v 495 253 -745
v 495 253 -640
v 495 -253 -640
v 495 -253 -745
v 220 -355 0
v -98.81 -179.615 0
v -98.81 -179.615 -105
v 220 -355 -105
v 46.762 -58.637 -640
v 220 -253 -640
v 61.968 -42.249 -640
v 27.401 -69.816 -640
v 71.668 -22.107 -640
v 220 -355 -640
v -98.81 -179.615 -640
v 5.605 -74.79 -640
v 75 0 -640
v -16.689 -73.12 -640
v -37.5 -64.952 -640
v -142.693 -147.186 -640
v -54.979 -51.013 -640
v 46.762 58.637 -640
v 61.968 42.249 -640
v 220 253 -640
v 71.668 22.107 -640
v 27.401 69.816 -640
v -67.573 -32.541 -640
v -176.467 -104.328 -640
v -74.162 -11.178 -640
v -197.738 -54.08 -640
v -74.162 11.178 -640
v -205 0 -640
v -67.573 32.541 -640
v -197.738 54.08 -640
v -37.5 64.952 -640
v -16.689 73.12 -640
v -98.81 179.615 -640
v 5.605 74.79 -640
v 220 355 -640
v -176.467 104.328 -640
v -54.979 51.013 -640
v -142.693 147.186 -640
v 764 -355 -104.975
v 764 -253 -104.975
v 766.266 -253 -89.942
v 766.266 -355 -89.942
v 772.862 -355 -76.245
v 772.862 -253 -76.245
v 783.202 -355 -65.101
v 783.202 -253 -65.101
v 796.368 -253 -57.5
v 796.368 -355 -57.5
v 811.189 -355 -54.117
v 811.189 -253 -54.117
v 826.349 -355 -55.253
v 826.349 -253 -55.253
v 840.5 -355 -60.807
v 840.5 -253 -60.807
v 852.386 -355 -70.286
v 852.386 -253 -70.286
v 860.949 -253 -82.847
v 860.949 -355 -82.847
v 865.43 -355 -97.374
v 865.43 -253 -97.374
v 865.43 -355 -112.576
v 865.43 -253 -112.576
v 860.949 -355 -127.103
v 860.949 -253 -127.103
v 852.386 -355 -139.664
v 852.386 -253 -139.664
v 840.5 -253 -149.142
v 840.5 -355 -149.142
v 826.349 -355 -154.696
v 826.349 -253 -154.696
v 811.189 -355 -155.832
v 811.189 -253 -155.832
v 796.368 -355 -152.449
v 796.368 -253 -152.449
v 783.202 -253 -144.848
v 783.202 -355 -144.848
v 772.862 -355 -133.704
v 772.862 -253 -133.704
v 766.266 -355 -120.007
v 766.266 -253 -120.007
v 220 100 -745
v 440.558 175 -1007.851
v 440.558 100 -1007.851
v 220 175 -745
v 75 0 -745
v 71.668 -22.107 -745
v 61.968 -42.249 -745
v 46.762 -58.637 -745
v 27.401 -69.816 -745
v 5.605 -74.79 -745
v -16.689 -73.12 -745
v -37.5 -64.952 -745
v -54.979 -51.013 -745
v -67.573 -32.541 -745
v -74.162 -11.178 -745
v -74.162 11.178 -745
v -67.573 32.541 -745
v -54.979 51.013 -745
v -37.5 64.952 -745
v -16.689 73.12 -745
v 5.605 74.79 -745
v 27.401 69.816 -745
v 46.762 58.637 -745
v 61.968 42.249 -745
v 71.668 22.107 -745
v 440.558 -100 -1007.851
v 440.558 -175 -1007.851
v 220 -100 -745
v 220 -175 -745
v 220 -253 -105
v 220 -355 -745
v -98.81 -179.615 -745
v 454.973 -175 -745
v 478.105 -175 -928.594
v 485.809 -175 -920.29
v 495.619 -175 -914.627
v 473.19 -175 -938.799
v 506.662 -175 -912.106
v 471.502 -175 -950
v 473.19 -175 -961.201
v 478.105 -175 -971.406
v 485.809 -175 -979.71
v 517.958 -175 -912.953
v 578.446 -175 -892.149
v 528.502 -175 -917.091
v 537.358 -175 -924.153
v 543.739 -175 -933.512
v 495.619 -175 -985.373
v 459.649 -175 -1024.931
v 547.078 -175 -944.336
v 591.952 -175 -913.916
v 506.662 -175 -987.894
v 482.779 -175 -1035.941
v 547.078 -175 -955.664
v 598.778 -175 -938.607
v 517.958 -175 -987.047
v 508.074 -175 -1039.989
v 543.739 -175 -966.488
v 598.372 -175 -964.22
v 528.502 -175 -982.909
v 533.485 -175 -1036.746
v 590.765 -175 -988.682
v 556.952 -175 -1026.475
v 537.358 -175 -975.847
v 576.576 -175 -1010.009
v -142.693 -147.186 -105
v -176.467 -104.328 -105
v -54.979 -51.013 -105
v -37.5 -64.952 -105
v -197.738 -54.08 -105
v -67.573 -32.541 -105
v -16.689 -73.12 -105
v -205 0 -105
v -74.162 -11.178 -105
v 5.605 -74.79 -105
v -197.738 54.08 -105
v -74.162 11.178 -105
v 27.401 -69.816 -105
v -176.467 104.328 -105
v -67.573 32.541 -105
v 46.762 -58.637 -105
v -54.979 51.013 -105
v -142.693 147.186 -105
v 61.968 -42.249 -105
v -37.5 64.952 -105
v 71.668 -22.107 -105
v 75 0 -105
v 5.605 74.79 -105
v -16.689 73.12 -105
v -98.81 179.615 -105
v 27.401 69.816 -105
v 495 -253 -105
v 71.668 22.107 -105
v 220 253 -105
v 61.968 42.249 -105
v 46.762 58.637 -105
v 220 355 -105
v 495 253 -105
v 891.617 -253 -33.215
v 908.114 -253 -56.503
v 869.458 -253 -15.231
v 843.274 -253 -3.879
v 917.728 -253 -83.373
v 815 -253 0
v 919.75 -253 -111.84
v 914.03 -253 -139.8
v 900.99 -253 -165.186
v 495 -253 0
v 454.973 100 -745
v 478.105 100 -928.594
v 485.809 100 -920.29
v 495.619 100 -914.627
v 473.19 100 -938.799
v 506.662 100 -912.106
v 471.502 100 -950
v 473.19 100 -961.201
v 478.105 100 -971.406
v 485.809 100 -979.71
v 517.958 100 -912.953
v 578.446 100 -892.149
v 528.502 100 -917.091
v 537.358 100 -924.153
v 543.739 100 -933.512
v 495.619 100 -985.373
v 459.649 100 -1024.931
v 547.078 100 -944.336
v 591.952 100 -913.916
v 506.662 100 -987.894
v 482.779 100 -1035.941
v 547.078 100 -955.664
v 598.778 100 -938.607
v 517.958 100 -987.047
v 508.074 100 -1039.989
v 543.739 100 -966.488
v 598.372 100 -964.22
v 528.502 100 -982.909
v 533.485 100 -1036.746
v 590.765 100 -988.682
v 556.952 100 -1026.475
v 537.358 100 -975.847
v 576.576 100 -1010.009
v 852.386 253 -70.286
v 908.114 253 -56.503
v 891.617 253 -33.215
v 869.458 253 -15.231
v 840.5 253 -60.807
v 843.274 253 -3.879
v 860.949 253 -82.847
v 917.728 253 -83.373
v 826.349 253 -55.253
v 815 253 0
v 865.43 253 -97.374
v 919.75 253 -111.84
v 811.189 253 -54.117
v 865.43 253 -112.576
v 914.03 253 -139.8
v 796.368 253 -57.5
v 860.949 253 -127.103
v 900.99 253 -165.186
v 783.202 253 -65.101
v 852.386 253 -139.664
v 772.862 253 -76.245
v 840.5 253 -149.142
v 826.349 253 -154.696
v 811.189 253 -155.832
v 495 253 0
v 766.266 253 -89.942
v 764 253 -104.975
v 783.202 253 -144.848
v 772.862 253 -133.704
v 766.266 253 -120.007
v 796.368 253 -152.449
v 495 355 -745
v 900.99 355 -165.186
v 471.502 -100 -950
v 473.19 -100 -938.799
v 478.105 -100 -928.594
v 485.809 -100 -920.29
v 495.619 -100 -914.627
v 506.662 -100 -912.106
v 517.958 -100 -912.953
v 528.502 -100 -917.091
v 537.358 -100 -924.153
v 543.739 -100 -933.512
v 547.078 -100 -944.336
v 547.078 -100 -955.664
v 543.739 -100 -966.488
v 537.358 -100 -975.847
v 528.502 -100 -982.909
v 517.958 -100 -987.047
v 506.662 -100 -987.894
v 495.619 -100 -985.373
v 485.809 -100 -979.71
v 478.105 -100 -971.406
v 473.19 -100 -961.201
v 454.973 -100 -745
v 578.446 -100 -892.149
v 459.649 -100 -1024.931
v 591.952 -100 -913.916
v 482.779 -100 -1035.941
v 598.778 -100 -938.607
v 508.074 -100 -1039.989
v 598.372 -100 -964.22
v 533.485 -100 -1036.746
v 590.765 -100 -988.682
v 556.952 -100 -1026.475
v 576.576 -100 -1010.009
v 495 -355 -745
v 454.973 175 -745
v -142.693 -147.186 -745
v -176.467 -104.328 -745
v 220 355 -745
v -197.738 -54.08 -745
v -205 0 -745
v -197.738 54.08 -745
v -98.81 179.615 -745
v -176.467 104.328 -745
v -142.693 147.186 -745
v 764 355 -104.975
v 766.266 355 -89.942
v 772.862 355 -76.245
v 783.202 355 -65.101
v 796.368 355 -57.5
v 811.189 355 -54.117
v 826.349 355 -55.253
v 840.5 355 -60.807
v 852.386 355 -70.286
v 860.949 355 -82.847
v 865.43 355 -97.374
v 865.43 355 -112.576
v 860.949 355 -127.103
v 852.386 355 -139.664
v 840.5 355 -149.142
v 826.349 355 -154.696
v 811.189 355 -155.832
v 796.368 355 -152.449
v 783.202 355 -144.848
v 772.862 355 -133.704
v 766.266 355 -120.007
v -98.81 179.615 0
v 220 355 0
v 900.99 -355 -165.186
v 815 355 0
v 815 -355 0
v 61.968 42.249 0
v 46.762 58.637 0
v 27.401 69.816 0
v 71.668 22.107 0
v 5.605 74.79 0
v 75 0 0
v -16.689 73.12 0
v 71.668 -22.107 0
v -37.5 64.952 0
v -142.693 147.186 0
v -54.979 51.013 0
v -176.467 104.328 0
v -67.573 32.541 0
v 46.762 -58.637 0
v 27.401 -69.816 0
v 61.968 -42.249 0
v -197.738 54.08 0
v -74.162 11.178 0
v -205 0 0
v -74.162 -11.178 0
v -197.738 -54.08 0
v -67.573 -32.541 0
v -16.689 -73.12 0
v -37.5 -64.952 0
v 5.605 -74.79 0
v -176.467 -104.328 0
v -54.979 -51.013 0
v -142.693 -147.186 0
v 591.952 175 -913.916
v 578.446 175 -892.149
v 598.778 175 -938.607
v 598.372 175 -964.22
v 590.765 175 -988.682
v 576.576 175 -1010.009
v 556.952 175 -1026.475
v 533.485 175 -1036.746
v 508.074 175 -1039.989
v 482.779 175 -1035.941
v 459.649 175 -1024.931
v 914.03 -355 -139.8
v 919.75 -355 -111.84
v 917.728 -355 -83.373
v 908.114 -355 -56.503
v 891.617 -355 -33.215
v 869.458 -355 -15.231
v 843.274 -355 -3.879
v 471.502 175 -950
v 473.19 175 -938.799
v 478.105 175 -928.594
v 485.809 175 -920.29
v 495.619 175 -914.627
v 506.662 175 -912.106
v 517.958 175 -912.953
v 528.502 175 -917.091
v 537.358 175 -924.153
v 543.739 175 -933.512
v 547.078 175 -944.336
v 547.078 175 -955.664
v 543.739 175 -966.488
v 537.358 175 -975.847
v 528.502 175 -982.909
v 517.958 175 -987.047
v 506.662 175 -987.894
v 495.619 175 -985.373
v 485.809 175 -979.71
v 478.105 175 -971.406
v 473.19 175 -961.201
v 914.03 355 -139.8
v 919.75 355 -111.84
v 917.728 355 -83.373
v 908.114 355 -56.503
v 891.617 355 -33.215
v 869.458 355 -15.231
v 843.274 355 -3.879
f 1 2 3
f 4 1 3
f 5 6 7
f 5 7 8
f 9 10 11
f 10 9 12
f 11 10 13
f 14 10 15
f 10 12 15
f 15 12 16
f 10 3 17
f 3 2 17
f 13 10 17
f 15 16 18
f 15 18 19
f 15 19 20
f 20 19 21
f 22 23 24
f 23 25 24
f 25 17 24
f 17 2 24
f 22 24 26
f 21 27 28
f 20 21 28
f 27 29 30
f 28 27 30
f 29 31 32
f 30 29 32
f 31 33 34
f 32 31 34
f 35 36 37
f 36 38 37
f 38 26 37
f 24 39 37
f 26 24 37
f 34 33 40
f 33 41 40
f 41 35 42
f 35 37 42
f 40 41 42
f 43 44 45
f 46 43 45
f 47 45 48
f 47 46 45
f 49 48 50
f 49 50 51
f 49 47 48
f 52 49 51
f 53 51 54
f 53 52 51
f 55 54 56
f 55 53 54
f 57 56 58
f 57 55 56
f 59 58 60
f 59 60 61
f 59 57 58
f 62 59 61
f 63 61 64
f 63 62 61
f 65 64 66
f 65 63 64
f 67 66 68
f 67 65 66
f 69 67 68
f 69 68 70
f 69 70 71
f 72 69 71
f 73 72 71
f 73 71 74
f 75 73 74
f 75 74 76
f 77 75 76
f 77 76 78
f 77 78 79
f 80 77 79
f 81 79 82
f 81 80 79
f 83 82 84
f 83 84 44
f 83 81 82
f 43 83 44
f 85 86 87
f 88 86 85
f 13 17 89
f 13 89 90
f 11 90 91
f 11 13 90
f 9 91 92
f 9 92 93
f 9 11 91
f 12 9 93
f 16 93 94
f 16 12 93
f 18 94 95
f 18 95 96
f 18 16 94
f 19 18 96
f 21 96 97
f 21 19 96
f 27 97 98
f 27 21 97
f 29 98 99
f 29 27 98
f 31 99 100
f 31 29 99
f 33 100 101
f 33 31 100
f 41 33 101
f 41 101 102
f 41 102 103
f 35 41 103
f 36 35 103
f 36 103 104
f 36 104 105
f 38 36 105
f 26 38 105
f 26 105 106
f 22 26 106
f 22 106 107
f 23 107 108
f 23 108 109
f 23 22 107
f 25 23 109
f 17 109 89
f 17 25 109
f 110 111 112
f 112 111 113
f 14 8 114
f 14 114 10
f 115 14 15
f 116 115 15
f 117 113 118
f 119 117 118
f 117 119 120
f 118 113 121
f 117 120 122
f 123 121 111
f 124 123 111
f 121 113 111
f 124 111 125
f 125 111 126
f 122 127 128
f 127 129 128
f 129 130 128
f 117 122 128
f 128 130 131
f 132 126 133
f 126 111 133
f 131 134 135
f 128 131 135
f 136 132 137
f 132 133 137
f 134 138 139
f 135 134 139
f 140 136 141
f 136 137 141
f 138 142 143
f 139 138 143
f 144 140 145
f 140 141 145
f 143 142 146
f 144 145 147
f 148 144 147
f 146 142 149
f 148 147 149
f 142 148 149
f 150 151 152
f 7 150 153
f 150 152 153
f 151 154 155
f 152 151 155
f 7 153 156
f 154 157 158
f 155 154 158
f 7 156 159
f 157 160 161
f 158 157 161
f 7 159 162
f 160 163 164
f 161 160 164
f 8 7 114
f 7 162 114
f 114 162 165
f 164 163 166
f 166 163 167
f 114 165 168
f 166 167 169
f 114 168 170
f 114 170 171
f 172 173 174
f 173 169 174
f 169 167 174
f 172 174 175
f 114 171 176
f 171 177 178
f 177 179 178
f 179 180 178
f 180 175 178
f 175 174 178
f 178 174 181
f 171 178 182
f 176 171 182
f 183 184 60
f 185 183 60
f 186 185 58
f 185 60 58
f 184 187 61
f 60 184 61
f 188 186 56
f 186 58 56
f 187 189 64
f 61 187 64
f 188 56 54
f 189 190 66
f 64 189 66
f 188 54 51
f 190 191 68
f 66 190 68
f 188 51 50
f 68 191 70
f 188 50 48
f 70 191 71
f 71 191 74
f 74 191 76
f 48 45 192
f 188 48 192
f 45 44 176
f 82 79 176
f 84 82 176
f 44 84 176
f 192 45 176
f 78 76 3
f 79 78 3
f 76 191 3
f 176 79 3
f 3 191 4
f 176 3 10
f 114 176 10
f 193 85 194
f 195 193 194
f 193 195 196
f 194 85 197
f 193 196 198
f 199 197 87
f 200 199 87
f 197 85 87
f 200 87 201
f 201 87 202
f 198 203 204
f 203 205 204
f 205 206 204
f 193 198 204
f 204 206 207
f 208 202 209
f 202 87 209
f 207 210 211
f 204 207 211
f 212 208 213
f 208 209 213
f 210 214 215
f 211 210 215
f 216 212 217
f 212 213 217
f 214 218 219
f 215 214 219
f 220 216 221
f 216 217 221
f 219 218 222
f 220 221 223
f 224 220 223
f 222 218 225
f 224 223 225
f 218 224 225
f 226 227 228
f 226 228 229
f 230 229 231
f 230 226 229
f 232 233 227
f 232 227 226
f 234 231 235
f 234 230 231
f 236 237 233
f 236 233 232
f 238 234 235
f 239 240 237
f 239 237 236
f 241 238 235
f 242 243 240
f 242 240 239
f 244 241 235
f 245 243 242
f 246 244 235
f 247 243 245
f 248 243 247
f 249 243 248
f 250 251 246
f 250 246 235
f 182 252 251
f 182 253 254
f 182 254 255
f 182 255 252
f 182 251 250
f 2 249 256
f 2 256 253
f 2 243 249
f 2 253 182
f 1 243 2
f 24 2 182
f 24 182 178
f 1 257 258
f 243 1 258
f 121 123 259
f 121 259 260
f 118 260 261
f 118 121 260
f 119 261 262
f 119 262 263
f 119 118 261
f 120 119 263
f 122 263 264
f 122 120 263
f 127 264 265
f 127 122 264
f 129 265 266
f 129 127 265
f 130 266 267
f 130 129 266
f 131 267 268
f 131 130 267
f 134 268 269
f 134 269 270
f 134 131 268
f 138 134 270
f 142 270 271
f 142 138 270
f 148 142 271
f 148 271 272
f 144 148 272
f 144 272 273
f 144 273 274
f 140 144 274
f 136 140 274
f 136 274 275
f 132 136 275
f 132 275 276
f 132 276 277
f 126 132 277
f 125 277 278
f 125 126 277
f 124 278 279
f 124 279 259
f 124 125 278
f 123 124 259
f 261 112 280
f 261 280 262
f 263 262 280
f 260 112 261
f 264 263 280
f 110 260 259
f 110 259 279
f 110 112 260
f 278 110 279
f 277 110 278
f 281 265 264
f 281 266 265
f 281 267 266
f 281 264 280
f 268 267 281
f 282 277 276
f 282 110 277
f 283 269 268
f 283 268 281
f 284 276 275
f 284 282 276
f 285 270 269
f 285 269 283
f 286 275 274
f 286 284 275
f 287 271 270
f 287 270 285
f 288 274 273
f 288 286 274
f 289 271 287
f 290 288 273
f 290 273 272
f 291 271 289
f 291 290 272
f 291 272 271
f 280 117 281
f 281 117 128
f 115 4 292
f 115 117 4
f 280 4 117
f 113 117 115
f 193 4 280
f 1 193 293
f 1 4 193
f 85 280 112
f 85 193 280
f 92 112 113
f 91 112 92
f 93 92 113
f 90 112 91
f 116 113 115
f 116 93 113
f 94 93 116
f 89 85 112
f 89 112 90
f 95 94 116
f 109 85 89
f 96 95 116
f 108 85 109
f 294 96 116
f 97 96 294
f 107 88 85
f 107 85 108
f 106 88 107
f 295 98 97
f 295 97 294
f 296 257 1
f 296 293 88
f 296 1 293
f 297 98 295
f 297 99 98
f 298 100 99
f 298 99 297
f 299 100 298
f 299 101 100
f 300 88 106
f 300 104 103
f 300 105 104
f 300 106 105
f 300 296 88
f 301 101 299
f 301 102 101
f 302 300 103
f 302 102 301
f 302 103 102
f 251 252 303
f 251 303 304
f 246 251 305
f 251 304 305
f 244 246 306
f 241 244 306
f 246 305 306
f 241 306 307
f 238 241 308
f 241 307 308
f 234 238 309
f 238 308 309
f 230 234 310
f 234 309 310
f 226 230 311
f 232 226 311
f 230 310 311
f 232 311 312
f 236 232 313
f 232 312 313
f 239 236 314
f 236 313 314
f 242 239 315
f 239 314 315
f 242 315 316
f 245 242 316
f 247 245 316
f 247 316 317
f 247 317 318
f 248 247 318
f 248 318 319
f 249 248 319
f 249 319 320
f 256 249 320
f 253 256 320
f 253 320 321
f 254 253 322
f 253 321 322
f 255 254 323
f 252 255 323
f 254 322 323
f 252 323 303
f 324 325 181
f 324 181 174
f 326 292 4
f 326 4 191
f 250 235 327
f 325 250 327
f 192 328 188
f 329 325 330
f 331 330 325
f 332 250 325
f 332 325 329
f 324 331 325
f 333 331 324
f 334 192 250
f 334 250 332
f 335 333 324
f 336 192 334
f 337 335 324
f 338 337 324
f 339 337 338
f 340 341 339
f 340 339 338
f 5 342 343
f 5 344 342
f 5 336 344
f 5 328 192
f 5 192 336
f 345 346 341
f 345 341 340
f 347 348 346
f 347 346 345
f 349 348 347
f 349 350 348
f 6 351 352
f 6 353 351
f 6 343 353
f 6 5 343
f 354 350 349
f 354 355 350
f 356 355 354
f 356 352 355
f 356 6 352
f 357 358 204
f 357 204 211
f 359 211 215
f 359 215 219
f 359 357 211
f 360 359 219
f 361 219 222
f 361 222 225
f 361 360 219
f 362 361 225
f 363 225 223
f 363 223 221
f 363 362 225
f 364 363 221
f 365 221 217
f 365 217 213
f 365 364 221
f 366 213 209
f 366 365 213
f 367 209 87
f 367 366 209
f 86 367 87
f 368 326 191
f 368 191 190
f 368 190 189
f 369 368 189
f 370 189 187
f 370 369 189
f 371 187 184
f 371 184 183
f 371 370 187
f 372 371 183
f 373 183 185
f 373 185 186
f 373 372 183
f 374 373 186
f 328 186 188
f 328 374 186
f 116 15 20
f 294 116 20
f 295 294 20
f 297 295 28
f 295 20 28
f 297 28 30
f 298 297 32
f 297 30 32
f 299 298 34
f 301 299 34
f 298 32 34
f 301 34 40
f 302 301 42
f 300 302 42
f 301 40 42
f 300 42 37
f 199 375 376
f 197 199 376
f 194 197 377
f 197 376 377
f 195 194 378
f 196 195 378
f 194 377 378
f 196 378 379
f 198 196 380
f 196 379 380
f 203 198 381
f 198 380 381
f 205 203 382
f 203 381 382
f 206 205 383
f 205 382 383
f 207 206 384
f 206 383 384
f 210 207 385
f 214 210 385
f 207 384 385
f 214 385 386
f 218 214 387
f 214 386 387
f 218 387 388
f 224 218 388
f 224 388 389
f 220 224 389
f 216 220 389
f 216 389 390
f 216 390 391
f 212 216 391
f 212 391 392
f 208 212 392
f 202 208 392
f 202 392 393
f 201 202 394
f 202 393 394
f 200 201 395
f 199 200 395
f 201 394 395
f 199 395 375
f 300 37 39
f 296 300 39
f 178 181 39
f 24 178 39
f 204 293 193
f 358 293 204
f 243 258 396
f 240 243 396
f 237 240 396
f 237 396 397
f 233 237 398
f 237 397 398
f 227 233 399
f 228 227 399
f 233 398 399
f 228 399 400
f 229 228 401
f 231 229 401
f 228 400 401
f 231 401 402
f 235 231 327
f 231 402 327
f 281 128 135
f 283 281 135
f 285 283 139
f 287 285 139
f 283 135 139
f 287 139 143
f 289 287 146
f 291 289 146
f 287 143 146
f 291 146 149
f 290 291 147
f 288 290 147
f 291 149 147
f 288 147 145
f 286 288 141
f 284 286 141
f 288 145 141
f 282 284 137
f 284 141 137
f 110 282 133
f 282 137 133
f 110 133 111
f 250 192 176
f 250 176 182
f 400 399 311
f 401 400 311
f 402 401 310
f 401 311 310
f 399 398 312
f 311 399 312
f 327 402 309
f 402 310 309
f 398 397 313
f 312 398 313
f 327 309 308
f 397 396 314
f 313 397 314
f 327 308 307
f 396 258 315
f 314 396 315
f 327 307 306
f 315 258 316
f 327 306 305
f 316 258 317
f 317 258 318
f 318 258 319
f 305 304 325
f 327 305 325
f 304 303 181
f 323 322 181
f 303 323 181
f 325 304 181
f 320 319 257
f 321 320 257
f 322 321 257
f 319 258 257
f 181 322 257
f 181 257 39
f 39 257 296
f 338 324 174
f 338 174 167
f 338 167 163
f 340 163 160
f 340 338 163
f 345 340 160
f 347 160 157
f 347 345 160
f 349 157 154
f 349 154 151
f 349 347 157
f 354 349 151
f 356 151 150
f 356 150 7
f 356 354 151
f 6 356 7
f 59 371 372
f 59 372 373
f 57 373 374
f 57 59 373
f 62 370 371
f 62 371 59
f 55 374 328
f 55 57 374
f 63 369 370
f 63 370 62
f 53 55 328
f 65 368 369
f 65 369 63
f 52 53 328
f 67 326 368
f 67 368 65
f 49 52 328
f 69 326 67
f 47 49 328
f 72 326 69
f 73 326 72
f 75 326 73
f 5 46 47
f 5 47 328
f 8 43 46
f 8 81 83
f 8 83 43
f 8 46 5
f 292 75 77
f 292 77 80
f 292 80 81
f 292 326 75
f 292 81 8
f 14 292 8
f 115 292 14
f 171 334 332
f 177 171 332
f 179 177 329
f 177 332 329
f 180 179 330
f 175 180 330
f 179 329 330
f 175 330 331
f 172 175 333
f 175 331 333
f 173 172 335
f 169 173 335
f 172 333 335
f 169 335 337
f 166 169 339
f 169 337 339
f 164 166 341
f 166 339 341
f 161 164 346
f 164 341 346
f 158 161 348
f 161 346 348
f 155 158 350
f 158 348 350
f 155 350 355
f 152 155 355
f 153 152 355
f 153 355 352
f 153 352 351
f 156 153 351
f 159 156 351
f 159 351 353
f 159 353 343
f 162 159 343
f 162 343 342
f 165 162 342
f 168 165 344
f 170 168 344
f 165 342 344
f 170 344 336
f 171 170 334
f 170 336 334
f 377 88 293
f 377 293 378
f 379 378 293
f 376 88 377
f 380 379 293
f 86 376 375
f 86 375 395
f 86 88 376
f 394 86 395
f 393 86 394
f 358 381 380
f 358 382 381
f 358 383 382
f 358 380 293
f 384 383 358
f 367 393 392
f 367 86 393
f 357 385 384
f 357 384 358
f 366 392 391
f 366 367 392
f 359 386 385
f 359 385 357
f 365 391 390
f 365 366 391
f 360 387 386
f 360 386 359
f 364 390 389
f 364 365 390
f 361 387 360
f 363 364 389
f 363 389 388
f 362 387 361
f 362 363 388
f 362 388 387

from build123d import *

# Parameters (mm, degrees)
SKETCH1_R           = 75
BOSS_EXTRUDE1_DEPTH = 105
SKETCH3_R           = 51
BOSS_EXTRUDE3_DEPTH = 102
BOSS_EXTRUDE4_START = -105
SKETCH7_R           = 75
BOSS_EXTRUDE4_DEPTH = 105
BOSS_EXTRUDE5_START = -180
SKETCH8_R           = 38
BOSS_EXTRUDE5_DEPTH = 75


with BuildPart() as part:
    # Sketch1 → Boss-Extrude1 (new body)
    with BuildSketch(Plane.XY):
        with BuildLine():
            Line((495, -355), (495, 355))
            Line((495, 355), (220, 355))
            Line((220, 355), (-98.810385884, 179.614887026))
            ThreePointArc((-98.810385884, 179.614887026), (-205, 0), (-98.810385884, -179.614887026))
            Line((-98.810385884, -179.614887026), (220, -355))
            Line((220, -355), (495, -355))
        make_face()
        Circle(SKETCH1_R, mode=Mode.SUBTRACT)
    extrude(amount=-BOSS_EXTRUDE1_DEPTH)

    # Sketch3 → Boss-Extrude3 (add)
    with BuildSketch(Plane(origin=(0, 355, 0), x_dir=(1, 0, 0), z_dir=(0, 1, 0))):
        with BuildLine():
            ThreePointArc((900.990279967, 165.185790909), (908.113739275, 56.502804044), (815, 0))
            Line((815, 0), (495, 0))
            Line((495, 0), (495, 105))
            Line((495, 105), (220, 105))
            Line((220, 105), (220, 745))
            Line((220, 745), (495, 745))
            Line((495, 745), (900.990279967, 165.185790909))
        make_face()
        with Locations(Location((815, 104.974748664, 0), (0, 0, 180))):
            Circle(SKETCH3_R, mode=Mode.SUBTRACT)
    boss_extrude3 = extrude(amount=-BOSS_EXTRUDE3_DEPTH)

    # Mirror1: Boss-Extrude3 across plane
    add(boss_extrude3.mirror(Plane.ZX))

    # Sketch7 → Boss-Extrude4 (add)
    with BuildSketch(Plane(origin=(0, 0, -745), x_dir=(-1, 0, 0), z_dir=(0, 0, -1)).offset(BOSS_EXTRUDE4_START)):
        with BuildLine():
            Line((-220, -253), (-220, -355))
            Line((-220, -355), (98.810385884, -179.614887026))
            ThreePointArc((98.810385884, -179.614887026), (205, 0), (98.810385884, 179.614887026))
            Line((98.810385884, 179.614887026), (-220, 355))
            Line((-220, 355), (-495, 355))
            Line((-495, 355), (-495, -253))
            Line((-495, -253), (-220, -253))
        make_face()
        with Locations(Location((0, 0, 0), (0, 0, 180))):
            Circle(SKETCH7_R, mode=Mode.SUBTRACT)
    extrude(amount=BOSS_EXTRUDE4_DEPTH)

    # Sketch8 → Boss-Extrude5 (add)
    with BuildSketch(Plane(origin=(0, 355, 0), x_dir=(1, 0, 0), z_dir=(0, 1, 0)).offset(BOSS_EXTRUDE5_START)):
        with BuildLine():
            Line((440.558080551, 1007.850884872), (220, 745))
            Line((220, 745), (454.97331208, 745))
            Line((454.97331208, 745), (578.446080312, 892.149115128))
            ThreePointArc((578.446080312, 892.149115128), (567.352965303, 1018.943999881), (440.558080551, 1007.850884872))
        make_face()
        with Locations(Location((509.502080431, 950, 0), (0, 0, 180))):
            Circle(SKETCH8_R, mode=Mode.SUBTRACT)
    boss_extrude5 = extrude(amount=-BOSS_EXTRUDE5_DEPTH)

    # Mirror2: Boss-Extrude5 across plane
    add(boss_extrude5.mirror(Plane.ZX))


solid = part.part
